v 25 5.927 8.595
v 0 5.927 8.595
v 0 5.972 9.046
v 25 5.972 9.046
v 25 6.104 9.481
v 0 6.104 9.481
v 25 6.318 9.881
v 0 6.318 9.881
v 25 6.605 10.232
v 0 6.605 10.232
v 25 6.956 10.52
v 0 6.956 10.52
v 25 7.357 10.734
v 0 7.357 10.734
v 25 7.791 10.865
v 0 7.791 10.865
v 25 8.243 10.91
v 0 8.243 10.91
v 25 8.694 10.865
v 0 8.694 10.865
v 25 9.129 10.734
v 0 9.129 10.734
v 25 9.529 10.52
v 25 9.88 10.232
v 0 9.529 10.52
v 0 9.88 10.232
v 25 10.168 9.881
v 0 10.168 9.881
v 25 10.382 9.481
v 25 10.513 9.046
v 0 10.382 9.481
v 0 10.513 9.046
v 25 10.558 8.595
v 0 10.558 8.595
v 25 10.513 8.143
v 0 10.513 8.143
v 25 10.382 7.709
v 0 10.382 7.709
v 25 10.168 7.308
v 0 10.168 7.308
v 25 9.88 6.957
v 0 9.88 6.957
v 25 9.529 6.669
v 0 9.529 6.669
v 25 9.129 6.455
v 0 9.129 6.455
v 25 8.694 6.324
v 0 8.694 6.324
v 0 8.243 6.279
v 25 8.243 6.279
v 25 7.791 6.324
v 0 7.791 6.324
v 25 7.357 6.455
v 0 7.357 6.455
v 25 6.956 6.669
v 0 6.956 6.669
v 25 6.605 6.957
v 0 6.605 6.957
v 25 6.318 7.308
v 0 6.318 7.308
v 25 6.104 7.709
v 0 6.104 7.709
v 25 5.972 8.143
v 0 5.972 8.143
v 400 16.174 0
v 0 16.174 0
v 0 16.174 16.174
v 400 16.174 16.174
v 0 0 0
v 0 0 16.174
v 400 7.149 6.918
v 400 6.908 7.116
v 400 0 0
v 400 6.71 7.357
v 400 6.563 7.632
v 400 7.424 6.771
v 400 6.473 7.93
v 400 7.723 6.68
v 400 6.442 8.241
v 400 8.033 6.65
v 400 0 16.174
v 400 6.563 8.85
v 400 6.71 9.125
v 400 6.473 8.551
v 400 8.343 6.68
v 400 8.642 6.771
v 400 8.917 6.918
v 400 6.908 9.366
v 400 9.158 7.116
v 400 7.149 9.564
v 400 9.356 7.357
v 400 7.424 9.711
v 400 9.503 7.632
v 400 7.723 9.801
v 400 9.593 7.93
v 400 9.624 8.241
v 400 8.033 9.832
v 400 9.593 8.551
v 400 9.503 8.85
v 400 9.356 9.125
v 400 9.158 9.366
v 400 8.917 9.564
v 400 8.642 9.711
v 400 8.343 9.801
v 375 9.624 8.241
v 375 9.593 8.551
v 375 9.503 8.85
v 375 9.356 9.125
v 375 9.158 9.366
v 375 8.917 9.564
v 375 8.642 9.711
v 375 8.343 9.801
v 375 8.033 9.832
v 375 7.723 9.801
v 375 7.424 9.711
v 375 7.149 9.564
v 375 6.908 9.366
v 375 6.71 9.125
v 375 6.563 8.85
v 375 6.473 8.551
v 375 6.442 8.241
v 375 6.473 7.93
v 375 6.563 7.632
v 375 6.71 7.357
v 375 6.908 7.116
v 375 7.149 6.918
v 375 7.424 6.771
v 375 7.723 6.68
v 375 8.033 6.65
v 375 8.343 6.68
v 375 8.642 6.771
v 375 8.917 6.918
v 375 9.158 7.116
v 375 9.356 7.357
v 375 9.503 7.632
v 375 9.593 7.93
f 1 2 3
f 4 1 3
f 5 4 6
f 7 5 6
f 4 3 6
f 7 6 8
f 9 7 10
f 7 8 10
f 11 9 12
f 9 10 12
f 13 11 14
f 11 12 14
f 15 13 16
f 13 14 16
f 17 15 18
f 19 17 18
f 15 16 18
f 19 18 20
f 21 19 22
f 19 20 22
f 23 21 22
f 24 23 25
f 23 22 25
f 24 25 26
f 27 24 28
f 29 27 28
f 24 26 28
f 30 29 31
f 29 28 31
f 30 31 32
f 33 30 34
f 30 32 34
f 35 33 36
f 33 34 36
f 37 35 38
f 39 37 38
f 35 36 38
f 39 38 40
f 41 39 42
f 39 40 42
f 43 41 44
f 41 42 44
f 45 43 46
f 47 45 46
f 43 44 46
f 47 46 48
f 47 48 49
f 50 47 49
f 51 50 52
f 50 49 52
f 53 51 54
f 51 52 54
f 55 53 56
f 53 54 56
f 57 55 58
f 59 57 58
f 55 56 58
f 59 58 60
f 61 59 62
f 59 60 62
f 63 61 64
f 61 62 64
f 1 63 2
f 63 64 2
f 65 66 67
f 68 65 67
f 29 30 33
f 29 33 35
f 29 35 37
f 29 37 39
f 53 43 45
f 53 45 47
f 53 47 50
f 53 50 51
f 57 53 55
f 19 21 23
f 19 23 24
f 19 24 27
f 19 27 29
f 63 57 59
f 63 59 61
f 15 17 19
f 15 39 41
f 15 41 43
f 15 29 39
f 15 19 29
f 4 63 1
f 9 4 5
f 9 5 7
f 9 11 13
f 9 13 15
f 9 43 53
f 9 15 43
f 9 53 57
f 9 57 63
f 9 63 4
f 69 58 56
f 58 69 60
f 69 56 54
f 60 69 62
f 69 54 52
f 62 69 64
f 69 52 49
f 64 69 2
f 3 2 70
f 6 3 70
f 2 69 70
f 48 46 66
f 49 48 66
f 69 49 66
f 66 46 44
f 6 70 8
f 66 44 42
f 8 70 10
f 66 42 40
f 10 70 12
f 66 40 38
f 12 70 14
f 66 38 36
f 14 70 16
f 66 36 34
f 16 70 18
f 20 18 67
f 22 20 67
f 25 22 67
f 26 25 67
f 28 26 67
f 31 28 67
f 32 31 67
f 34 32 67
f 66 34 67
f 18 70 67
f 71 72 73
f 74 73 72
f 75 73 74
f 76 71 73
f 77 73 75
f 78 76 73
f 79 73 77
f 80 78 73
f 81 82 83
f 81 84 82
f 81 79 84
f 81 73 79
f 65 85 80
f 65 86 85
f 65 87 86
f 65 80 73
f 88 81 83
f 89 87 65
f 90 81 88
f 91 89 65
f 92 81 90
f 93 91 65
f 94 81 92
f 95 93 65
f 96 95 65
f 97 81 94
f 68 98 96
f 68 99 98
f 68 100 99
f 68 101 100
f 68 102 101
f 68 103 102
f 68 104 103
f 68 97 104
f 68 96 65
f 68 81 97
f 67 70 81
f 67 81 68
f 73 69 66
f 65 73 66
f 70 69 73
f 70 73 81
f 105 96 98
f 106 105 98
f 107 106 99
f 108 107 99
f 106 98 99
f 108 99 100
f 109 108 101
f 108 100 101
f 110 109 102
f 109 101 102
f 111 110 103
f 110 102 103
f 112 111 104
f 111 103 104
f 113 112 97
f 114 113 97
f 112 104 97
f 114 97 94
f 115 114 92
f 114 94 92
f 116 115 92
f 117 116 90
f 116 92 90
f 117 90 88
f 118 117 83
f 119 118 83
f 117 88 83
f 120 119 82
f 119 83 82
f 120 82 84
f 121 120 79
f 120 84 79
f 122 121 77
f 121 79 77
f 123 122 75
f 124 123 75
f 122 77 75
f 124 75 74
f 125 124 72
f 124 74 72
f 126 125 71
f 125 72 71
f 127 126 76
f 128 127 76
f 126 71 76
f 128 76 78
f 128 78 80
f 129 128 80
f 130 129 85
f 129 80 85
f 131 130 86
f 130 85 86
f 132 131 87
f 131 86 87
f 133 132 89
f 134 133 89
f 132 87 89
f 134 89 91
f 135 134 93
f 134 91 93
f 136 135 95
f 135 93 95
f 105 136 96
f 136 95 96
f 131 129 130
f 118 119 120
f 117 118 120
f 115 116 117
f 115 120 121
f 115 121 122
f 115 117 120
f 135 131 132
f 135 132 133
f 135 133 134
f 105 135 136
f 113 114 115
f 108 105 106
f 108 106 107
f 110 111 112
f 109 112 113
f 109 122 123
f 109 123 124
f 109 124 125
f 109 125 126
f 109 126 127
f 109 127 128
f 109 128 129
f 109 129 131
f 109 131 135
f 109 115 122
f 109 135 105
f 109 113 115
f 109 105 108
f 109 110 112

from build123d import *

# Parameters (mm, degrees)
F0_W     = 16.174244
F0_H     = 16.174244
F1_DEPTH = 400
F2_R     = 2.315336
F3_DEPTH = 25
F4_R     = 1.59091
F5_DEPTH = 25


with BuildPart() as f1:
    # F0 (on Right) → F1 (new body)
    with BuildSketch(Plane.YZ):
        with Locations((8.087122, 8.087122)):
            Rectangle(F0_W, F0_H)
    extrude(amount=F1_DEPTH)

    # F2 (on face) → F3 (cut)
    with BuildSketch(Plane(origin=(0, 0, 0), x_dir=(0, -1, 0), z_dir=(-1, 0, 0))):
        with Locations((-8.242639, 8.594578)):
            Circle(F2_R)
    extrude(amount=-F3_DEPTH, mode=Mode.SUBTRACT)

    # F4 (on face) → F5 (cut)
    with BuildSketch(Plane.YZ.offset(400)):
        with Locations((8.032903, 8.240791)):
            Circle(F4_R)
    extrude(amount=-F5_DEPTH, mode=Mode.SUBTRACT)


solid = f1.part
